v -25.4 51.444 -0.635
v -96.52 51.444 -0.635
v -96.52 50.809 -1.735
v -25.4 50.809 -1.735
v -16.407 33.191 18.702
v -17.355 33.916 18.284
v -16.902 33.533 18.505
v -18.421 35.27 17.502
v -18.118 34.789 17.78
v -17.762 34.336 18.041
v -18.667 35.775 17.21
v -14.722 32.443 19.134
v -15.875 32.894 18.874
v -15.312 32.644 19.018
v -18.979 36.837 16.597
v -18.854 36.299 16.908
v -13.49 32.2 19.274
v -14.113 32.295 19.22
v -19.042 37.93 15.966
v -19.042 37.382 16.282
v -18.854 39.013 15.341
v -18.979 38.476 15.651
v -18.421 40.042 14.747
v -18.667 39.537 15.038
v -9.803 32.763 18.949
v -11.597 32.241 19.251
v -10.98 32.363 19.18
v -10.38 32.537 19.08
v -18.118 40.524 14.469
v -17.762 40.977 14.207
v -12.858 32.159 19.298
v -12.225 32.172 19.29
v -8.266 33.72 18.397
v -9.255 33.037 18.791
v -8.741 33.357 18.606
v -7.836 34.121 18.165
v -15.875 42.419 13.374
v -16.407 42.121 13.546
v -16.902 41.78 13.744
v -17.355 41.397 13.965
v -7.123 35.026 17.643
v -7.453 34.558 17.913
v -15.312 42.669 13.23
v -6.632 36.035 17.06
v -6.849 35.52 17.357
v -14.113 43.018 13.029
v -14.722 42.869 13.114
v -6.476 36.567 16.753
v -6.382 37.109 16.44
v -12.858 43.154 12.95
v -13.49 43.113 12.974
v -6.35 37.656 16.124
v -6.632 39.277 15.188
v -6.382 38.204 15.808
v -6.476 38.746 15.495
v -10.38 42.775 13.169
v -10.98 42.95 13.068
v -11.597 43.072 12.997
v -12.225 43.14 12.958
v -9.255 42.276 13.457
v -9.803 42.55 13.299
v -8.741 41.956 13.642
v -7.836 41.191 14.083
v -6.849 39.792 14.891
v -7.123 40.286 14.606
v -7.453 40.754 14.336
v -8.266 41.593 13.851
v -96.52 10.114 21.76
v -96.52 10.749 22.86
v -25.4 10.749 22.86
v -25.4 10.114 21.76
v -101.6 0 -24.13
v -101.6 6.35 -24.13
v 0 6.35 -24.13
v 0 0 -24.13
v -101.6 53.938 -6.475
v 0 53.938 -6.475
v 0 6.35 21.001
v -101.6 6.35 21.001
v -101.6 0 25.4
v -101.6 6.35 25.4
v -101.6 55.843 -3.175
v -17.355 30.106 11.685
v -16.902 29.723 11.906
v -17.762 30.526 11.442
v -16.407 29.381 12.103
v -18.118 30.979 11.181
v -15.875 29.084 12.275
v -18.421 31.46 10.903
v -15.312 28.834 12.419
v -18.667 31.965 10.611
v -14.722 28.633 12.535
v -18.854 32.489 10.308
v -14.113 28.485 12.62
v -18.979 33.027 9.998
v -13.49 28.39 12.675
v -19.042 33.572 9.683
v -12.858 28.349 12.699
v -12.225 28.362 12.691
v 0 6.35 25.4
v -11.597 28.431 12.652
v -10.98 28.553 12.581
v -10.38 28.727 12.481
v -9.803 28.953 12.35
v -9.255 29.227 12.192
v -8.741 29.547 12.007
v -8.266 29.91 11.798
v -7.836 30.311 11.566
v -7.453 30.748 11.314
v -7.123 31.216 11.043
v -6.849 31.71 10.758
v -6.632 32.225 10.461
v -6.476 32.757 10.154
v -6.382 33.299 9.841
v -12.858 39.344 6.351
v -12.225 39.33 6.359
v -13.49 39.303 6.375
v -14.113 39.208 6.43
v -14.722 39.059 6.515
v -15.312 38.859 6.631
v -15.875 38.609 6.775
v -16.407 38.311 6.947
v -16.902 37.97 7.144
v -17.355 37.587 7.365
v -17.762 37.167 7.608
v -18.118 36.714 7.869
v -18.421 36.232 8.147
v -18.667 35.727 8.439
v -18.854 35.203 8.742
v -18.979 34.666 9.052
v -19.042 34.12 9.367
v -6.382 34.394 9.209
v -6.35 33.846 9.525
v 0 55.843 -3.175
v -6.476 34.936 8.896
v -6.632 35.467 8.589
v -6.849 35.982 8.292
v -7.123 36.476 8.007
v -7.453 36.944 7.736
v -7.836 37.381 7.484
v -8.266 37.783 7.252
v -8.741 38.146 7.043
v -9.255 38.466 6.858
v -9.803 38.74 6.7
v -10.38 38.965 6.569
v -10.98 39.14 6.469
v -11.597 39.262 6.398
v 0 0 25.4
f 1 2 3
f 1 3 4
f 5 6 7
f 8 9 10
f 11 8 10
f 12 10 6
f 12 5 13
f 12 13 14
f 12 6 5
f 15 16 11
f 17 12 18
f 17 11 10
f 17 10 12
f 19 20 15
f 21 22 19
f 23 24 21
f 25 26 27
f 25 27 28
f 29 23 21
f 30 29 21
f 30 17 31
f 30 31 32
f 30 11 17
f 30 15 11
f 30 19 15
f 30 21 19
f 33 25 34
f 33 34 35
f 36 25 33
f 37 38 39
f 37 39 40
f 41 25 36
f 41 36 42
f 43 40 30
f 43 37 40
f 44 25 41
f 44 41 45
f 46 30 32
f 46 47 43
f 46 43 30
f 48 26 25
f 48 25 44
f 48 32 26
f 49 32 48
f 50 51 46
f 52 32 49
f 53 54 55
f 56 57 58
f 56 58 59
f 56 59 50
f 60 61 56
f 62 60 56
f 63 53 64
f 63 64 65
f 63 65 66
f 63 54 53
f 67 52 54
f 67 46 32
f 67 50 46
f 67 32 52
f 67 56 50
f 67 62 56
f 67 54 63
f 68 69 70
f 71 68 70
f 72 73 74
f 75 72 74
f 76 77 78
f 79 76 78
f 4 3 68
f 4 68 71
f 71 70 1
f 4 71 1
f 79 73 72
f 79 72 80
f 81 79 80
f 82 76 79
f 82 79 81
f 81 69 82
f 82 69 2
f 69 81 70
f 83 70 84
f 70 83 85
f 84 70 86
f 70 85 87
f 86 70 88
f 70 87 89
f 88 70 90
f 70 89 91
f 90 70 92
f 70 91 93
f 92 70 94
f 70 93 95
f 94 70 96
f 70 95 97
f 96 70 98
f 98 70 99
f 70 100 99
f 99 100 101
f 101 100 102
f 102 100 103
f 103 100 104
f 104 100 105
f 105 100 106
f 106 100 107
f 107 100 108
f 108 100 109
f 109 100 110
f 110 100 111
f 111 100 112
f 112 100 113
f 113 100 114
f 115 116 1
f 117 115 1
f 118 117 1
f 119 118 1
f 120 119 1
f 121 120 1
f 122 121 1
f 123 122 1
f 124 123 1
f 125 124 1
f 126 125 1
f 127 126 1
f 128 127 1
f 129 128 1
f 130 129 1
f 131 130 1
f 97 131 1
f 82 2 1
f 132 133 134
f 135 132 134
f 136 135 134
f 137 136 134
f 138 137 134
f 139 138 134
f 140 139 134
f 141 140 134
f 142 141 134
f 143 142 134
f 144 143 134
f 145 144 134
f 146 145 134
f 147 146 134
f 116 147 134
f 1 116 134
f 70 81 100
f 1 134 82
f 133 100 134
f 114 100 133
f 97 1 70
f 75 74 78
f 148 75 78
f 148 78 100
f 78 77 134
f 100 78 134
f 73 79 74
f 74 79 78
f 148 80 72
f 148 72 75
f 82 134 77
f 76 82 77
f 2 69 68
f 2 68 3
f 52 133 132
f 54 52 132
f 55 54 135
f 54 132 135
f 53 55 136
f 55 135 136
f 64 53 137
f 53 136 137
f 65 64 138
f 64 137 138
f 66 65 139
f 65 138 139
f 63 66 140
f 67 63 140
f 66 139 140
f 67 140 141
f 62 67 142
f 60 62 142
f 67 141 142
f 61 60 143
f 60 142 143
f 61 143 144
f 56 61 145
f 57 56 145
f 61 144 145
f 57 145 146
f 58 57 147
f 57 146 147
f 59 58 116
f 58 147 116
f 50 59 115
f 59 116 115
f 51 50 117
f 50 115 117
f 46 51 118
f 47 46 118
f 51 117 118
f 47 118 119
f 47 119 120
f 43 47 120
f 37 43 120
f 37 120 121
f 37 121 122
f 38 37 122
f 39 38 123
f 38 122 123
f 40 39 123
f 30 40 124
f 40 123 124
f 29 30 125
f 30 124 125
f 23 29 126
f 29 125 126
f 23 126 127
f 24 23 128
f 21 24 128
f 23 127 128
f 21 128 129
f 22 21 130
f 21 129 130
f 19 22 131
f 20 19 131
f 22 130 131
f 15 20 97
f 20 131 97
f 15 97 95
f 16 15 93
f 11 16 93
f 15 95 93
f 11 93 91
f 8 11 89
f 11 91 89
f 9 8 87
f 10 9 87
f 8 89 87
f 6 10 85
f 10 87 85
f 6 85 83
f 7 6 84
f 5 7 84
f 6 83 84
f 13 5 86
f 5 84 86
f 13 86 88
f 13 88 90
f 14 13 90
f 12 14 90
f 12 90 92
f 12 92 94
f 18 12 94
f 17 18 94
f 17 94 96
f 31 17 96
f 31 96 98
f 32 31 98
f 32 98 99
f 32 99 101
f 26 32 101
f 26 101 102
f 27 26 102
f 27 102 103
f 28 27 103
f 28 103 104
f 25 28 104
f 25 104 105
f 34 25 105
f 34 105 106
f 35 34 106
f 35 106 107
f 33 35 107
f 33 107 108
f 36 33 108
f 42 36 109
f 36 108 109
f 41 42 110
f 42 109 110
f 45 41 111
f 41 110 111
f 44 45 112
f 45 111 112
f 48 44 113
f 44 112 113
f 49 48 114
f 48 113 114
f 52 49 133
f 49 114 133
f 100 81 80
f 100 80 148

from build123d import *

# Parameters (mm, degrees)
SKETCH1_W                = 101.6
SKETCH1_H                = 6.35
BOSS_EXTRUDE1_DEPTH      = 25.4
BOSS_EXTRUDE1_DEPTH_BACK = 24.13
BOSS_EXTRUDE2_DEPTH      = 101.6
SKETCH3_W                = 71.12
SKETCH3_H                = 46.99
CUT_EXTRUDE1_DEPTH       = 1.27
SKETCH4_R                = 6.35
BOSS_EXTRUDE3_DEPTH      = 7.62


with BuildPart() as part:
    # Sketch1 → Boss-Extrude1 (new body, two sides)
    with BuildSketch(Plane.XY) as boss_extrude1_sk:
        with Locations((-50.8, 3.175)):
            Rectangle(SKETCH1_W, SKETCH1_H)
    extrude(amount=BOSS_EXTRUDE1_DEPTH)
    extrude(boss_extrude1_sk.sketch, amount=-BOSS_EXTRUDE1_DEPTH_BACK)

    # Sketch2 → Boss-Extrude2 (add)
    with BuildSketch(Plane(origin=(0, 0, 0), x_dir=(0, 0, -1), z_dir=(1, 0, 0))):
        Polygon((-25.4, 6.35), (3.175, 55.843351826), (6.474556788, 53.938351826), (-21.000590949, 6.35), align=None)
    extrude(amount=-BOSS_EXTRUDE2_DEPTH)

    # Sketch3 → Cut-Extrude1 (cut)
    with BuildSketch(Plane(origin=(0, 12.586022628, 21.799630657), x_dir=(1, 0, 0), z_dir=(0, 0.5, 0.866025404))):
        with Locations((-60.96, 21.374261314)):
            Rectangle(SKETCH3_W, SKETCH3_H)
    extrude(amount=-CUT_EXTRUDE1_DEPTH, mode=Mode.SUBTRACT)

    # Sketch4 → Boss-Extrude3 (add)
    with BuildSketch(Plane(origin=(0, 12.586022628, 21.799630657), x_dir=(1, 0, 0), z_dir=(0, 0.5, 0.866025404))):
        with Locations((-12.7, 24.549261314)):
            Circle(SKETCH4_R)
    extrude(amount=BOSS_EXTRUDE3_DEPTH)


solid = part.part
